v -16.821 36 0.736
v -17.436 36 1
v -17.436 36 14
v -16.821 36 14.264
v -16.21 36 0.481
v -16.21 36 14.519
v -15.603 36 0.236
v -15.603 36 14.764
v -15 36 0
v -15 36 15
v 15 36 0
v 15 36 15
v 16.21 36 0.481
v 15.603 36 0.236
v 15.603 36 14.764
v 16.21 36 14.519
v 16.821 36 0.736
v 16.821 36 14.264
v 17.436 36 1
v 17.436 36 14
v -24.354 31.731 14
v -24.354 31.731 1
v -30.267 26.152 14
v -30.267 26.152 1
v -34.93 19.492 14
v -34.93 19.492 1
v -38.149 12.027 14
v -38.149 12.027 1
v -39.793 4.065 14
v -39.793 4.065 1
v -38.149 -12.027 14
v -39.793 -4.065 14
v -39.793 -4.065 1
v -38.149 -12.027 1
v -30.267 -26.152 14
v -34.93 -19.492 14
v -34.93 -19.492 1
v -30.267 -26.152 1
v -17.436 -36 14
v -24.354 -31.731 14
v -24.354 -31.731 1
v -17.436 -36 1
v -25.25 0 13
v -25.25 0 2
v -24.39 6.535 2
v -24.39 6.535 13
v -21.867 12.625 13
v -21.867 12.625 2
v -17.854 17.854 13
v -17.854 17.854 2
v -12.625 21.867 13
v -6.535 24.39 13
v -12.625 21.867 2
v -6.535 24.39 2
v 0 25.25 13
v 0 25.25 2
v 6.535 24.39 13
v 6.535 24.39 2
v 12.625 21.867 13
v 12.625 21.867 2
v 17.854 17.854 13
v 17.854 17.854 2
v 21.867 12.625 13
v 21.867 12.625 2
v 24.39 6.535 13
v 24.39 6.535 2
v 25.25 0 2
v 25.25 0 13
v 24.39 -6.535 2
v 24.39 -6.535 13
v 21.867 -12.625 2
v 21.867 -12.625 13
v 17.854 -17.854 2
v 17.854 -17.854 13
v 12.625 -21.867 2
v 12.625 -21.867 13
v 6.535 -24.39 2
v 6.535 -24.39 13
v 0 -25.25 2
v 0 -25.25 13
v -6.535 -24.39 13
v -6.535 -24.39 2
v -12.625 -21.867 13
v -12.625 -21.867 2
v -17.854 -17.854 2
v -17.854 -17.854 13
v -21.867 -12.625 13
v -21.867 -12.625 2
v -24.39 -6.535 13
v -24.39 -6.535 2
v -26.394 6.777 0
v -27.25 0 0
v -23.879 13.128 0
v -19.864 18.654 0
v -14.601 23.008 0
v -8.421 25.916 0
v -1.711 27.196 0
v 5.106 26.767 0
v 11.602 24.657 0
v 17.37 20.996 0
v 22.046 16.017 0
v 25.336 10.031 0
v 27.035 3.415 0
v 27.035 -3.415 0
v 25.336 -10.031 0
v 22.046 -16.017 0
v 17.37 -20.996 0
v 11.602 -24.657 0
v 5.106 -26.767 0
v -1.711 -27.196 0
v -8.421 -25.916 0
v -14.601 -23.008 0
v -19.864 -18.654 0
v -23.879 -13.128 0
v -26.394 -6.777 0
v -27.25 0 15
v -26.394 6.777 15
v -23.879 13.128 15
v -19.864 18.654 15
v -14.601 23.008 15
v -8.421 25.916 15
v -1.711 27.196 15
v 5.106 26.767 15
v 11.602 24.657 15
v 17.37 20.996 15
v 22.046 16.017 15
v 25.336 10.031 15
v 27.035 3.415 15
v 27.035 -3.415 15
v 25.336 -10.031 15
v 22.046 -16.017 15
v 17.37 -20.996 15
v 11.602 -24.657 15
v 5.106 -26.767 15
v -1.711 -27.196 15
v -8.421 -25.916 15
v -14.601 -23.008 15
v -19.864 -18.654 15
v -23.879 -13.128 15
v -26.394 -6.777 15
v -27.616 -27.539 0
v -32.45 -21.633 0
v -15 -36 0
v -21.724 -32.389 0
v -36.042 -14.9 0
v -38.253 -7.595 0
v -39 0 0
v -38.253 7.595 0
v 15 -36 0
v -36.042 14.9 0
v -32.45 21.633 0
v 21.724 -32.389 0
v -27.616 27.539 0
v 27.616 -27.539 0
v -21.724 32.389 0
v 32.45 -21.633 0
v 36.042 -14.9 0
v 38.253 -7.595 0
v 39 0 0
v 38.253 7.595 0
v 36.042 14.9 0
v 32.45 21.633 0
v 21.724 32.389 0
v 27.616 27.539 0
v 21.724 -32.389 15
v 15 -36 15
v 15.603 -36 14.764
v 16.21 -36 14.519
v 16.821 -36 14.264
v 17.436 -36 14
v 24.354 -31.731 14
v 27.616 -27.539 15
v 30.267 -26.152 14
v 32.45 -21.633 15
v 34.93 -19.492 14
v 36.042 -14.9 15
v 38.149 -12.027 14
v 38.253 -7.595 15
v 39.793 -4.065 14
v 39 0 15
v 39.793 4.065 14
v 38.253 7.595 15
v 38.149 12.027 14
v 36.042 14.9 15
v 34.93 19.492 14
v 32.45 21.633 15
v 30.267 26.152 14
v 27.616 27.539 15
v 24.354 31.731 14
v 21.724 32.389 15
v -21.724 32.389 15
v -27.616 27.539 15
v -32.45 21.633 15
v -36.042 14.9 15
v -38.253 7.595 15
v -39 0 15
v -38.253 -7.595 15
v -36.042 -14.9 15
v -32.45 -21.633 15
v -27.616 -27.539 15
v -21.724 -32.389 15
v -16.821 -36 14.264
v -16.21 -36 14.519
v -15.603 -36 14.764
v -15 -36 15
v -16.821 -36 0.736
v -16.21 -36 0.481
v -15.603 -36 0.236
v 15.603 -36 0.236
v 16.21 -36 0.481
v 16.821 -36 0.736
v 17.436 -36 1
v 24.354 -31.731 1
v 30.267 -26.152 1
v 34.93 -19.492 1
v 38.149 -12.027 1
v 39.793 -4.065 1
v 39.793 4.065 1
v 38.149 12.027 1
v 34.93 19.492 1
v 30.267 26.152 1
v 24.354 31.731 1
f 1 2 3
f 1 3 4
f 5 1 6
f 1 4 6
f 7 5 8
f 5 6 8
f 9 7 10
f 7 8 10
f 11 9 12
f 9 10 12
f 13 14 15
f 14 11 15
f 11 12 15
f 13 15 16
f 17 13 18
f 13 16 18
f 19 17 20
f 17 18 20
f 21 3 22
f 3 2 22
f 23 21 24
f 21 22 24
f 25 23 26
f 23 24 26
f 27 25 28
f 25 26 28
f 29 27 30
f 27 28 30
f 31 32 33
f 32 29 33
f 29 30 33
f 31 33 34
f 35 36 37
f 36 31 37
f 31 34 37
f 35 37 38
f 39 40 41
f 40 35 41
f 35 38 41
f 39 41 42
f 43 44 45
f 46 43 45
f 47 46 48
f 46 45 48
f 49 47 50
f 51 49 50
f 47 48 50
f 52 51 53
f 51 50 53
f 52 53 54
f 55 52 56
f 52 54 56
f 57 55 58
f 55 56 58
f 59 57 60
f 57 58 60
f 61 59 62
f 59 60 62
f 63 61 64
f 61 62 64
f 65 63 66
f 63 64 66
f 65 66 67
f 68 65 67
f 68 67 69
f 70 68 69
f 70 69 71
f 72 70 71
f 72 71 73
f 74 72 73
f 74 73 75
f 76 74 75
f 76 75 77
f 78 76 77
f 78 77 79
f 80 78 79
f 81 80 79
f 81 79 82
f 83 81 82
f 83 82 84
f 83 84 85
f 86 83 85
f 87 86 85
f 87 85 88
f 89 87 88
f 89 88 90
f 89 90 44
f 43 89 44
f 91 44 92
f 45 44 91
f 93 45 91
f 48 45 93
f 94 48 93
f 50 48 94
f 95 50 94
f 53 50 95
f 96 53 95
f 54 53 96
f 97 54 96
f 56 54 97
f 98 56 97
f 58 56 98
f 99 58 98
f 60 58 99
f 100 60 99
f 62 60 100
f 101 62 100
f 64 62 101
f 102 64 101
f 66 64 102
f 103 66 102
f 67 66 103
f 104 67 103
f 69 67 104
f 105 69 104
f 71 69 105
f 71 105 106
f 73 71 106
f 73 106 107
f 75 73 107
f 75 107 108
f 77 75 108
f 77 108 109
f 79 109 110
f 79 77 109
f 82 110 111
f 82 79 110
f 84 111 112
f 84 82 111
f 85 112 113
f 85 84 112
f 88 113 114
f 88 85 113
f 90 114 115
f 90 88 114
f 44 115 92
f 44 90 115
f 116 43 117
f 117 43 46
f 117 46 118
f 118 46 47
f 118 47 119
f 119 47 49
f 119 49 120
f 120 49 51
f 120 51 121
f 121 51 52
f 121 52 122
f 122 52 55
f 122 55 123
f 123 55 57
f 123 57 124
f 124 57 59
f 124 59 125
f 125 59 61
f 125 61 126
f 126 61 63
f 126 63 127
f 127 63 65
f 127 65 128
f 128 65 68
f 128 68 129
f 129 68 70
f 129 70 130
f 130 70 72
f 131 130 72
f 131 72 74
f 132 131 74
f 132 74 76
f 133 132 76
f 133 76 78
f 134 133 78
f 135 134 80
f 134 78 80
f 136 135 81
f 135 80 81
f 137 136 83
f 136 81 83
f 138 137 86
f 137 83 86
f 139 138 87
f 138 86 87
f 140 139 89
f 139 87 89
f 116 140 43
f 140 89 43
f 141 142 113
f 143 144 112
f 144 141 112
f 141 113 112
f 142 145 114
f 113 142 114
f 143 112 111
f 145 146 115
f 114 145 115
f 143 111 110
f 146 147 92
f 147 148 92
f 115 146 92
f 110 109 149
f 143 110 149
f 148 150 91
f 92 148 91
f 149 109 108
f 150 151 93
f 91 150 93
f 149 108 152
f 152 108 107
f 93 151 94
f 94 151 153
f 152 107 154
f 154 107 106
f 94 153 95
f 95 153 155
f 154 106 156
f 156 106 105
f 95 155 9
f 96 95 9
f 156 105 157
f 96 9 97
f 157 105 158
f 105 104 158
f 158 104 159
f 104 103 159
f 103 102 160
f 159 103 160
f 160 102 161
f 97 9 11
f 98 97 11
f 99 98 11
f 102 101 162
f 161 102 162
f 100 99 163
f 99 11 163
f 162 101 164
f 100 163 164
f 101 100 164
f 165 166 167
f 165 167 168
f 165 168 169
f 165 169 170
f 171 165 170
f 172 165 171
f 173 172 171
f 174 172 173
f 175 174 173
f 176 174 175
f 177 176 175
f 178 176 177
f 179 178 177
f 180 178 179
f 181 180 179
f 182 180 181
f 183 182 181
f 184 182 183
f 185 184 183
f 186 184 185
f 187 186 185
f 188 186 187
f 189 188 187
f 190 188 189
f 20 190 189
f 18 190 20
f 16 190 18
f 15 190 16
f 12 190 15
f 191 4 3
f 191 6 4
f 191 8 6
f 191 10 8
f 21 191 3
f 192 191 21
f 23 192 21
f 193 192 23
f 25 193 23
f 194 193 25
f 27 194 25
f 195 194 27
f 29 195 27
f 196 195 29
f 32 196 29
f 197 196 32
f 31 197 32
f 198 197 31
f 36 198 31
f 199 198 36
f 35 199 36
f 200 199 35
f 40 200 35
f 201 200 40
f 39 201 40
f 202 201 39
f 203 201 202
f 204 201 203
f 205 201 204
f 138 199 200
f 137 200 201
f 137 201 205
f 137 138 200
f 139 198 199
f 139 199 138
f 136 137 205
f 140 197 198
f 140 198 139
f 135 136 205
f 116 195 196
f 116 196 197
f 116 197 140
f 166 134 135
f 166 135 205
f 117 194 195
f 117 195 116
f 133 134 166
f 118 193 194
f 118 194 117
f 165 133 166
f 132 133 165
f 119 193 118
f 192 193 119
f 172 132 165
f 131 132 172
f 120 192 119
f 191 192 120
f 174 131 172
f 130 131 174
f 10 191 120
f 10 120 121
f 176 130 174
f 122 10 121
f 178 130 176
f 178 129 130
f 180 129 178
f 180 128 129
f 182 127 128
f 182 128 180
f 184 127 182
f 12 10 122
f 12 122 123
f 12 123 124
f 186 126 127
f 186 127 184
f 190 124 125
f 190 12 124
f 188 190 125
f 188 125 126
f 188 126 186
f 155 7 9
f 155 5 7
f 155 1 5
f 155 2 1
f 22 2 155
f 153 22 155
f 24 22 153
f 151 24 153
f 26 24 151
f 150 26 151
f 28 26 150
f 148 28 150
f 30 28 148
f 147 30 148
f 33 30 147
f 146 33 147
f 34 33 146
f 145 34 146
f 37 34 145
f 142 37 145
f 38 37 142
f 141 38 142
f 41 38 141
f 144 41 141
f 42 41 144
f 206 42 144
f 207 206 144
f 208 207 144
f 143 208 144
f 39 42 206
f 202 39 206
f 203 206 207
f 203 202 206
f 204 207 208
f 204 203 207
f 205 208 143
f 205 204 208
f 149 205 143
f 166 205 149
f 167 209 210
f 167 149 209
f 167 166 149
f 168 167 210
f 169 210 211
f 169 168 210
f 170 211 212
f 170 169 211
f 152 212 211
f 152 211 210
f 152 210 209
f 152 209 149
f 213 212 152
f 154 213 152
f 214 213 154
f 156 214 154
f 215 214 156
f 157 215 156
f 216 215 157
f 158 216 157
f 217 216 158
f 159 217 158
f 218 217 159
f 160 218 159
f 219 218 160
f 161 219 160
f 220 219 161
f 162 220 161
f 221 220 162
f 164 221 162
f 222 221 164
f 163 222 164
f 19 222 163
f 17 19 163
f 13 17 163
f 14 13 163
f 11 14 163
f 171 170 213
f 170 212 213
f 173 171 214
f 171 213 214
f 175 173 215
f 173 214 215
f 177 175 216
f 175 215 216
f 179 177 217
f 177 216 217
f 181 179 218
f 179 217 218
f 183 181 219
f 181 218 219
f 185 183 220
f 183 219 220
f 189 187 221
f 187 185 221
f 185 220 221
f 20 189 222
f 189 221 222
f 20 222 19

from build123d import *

# Parameters (mm, degrees)
SZKIC1_R                    = 40
DODANIE_WYCI_GNI_CIE1_DEPTH = 15
OTW_R_GWINTOWANY_M561_D     = 50.5
SFAZOWANIE1_SIZE            = 2
SFAZOWANIE2_SIZE            = 1
WYTNIJ_WYCI_GNI_CIE1_REACH  = 60.523
SZKIC4_W                    = 81.267228601
SZKIC4_H                    = 11.1112586


with BuildPart() as part:
    # Szkic1 → Dodanie-wyciągnięcie1 (new body)
    with BuildSketch(Plane.XY):
        Circle(SZKIC1_R)
    extrude(amount=DODANIE_WYCI_GNI_CIE1_DEPTH)

    # Otwór gwintowany M561 (through all)
    with Locations(Plane.XY.offset(15)):
        with Locations((0, 0)):
            Hole(OTW_R_GWINTOWANY_M561_D / 2)

    # Sfazowanie1
    sfazowanie1_edges = [part.edges().sort_by_distance(p)[0] for p in [
        (25.25, 0, 15),
        (25.25, 0, 0),
    ]]
    chamfer(sfazowanie1_edges, length=SFAZOWANIE1_SIZE)

    # Sfazowanie2
    sfazowanie2_edges = [part.edges().sort_by_distance(p)[0] for p in [
        (-40, 0, 0),
        (-40, 0, 15),
    ]]
    chamfer(sfazowanie2_edges, length=SFAZOWANIE2_SIZE)

    # Szkic4 → Wytnij-wyciągnięcie1 (cut, up to next)
    with BuildSketch(Plane.XY.offset(15), mode=Mode.PRIVATE) as wytnij_wyci_gni_cie1_sk1:
        with Locations((-4.392823168, -41.5556293)):
            Rectangle(SZKIC4_W, SZKIC4_H)
    wytnij_wyci_gni_cie1_tool1 = extrude(wytnij_wyci_gni_cie1_sk1.sketch, amount=-WYTNIJ_WYCI_GNI_CIE1_REACH, mode=Mode.PRIVATE) & part.part
    # Szkic4 → Wytnij-wyciągnięcie1 (cut, up to next)
    with BuildSketch(Plane.XY.offset(15), mode=Mode.PRIVATE) as wytnij_wyci_gni_cie1_sk2:
        with Locations((-4.392823168, 41.5556293)):
            Rectangle(SZKIC4_W, SZKIC4_H)
    wytnij_wyci_gni_cie1_tool2 = extrude(wytnij_wyci_gni_cie1_sk2.sketch, amount=-WYTNIJ_WYCI_GNI_CIE1_REACH, mode=Mode.PRIVATE) & part.part
    add(wytnij_wyci_gni_cie1_tool1.solids().sort_by_distance((-4.392823, -41.555629, 15))[0], mode=Mode.SUBTRACT)
    add(wytnij_wyci_gni_cie1_tool2.solids().sort_by_distance((-4.392823, 41.555629, 15))[0], mode=Mode.SUBTRACT)


solid = part.part
